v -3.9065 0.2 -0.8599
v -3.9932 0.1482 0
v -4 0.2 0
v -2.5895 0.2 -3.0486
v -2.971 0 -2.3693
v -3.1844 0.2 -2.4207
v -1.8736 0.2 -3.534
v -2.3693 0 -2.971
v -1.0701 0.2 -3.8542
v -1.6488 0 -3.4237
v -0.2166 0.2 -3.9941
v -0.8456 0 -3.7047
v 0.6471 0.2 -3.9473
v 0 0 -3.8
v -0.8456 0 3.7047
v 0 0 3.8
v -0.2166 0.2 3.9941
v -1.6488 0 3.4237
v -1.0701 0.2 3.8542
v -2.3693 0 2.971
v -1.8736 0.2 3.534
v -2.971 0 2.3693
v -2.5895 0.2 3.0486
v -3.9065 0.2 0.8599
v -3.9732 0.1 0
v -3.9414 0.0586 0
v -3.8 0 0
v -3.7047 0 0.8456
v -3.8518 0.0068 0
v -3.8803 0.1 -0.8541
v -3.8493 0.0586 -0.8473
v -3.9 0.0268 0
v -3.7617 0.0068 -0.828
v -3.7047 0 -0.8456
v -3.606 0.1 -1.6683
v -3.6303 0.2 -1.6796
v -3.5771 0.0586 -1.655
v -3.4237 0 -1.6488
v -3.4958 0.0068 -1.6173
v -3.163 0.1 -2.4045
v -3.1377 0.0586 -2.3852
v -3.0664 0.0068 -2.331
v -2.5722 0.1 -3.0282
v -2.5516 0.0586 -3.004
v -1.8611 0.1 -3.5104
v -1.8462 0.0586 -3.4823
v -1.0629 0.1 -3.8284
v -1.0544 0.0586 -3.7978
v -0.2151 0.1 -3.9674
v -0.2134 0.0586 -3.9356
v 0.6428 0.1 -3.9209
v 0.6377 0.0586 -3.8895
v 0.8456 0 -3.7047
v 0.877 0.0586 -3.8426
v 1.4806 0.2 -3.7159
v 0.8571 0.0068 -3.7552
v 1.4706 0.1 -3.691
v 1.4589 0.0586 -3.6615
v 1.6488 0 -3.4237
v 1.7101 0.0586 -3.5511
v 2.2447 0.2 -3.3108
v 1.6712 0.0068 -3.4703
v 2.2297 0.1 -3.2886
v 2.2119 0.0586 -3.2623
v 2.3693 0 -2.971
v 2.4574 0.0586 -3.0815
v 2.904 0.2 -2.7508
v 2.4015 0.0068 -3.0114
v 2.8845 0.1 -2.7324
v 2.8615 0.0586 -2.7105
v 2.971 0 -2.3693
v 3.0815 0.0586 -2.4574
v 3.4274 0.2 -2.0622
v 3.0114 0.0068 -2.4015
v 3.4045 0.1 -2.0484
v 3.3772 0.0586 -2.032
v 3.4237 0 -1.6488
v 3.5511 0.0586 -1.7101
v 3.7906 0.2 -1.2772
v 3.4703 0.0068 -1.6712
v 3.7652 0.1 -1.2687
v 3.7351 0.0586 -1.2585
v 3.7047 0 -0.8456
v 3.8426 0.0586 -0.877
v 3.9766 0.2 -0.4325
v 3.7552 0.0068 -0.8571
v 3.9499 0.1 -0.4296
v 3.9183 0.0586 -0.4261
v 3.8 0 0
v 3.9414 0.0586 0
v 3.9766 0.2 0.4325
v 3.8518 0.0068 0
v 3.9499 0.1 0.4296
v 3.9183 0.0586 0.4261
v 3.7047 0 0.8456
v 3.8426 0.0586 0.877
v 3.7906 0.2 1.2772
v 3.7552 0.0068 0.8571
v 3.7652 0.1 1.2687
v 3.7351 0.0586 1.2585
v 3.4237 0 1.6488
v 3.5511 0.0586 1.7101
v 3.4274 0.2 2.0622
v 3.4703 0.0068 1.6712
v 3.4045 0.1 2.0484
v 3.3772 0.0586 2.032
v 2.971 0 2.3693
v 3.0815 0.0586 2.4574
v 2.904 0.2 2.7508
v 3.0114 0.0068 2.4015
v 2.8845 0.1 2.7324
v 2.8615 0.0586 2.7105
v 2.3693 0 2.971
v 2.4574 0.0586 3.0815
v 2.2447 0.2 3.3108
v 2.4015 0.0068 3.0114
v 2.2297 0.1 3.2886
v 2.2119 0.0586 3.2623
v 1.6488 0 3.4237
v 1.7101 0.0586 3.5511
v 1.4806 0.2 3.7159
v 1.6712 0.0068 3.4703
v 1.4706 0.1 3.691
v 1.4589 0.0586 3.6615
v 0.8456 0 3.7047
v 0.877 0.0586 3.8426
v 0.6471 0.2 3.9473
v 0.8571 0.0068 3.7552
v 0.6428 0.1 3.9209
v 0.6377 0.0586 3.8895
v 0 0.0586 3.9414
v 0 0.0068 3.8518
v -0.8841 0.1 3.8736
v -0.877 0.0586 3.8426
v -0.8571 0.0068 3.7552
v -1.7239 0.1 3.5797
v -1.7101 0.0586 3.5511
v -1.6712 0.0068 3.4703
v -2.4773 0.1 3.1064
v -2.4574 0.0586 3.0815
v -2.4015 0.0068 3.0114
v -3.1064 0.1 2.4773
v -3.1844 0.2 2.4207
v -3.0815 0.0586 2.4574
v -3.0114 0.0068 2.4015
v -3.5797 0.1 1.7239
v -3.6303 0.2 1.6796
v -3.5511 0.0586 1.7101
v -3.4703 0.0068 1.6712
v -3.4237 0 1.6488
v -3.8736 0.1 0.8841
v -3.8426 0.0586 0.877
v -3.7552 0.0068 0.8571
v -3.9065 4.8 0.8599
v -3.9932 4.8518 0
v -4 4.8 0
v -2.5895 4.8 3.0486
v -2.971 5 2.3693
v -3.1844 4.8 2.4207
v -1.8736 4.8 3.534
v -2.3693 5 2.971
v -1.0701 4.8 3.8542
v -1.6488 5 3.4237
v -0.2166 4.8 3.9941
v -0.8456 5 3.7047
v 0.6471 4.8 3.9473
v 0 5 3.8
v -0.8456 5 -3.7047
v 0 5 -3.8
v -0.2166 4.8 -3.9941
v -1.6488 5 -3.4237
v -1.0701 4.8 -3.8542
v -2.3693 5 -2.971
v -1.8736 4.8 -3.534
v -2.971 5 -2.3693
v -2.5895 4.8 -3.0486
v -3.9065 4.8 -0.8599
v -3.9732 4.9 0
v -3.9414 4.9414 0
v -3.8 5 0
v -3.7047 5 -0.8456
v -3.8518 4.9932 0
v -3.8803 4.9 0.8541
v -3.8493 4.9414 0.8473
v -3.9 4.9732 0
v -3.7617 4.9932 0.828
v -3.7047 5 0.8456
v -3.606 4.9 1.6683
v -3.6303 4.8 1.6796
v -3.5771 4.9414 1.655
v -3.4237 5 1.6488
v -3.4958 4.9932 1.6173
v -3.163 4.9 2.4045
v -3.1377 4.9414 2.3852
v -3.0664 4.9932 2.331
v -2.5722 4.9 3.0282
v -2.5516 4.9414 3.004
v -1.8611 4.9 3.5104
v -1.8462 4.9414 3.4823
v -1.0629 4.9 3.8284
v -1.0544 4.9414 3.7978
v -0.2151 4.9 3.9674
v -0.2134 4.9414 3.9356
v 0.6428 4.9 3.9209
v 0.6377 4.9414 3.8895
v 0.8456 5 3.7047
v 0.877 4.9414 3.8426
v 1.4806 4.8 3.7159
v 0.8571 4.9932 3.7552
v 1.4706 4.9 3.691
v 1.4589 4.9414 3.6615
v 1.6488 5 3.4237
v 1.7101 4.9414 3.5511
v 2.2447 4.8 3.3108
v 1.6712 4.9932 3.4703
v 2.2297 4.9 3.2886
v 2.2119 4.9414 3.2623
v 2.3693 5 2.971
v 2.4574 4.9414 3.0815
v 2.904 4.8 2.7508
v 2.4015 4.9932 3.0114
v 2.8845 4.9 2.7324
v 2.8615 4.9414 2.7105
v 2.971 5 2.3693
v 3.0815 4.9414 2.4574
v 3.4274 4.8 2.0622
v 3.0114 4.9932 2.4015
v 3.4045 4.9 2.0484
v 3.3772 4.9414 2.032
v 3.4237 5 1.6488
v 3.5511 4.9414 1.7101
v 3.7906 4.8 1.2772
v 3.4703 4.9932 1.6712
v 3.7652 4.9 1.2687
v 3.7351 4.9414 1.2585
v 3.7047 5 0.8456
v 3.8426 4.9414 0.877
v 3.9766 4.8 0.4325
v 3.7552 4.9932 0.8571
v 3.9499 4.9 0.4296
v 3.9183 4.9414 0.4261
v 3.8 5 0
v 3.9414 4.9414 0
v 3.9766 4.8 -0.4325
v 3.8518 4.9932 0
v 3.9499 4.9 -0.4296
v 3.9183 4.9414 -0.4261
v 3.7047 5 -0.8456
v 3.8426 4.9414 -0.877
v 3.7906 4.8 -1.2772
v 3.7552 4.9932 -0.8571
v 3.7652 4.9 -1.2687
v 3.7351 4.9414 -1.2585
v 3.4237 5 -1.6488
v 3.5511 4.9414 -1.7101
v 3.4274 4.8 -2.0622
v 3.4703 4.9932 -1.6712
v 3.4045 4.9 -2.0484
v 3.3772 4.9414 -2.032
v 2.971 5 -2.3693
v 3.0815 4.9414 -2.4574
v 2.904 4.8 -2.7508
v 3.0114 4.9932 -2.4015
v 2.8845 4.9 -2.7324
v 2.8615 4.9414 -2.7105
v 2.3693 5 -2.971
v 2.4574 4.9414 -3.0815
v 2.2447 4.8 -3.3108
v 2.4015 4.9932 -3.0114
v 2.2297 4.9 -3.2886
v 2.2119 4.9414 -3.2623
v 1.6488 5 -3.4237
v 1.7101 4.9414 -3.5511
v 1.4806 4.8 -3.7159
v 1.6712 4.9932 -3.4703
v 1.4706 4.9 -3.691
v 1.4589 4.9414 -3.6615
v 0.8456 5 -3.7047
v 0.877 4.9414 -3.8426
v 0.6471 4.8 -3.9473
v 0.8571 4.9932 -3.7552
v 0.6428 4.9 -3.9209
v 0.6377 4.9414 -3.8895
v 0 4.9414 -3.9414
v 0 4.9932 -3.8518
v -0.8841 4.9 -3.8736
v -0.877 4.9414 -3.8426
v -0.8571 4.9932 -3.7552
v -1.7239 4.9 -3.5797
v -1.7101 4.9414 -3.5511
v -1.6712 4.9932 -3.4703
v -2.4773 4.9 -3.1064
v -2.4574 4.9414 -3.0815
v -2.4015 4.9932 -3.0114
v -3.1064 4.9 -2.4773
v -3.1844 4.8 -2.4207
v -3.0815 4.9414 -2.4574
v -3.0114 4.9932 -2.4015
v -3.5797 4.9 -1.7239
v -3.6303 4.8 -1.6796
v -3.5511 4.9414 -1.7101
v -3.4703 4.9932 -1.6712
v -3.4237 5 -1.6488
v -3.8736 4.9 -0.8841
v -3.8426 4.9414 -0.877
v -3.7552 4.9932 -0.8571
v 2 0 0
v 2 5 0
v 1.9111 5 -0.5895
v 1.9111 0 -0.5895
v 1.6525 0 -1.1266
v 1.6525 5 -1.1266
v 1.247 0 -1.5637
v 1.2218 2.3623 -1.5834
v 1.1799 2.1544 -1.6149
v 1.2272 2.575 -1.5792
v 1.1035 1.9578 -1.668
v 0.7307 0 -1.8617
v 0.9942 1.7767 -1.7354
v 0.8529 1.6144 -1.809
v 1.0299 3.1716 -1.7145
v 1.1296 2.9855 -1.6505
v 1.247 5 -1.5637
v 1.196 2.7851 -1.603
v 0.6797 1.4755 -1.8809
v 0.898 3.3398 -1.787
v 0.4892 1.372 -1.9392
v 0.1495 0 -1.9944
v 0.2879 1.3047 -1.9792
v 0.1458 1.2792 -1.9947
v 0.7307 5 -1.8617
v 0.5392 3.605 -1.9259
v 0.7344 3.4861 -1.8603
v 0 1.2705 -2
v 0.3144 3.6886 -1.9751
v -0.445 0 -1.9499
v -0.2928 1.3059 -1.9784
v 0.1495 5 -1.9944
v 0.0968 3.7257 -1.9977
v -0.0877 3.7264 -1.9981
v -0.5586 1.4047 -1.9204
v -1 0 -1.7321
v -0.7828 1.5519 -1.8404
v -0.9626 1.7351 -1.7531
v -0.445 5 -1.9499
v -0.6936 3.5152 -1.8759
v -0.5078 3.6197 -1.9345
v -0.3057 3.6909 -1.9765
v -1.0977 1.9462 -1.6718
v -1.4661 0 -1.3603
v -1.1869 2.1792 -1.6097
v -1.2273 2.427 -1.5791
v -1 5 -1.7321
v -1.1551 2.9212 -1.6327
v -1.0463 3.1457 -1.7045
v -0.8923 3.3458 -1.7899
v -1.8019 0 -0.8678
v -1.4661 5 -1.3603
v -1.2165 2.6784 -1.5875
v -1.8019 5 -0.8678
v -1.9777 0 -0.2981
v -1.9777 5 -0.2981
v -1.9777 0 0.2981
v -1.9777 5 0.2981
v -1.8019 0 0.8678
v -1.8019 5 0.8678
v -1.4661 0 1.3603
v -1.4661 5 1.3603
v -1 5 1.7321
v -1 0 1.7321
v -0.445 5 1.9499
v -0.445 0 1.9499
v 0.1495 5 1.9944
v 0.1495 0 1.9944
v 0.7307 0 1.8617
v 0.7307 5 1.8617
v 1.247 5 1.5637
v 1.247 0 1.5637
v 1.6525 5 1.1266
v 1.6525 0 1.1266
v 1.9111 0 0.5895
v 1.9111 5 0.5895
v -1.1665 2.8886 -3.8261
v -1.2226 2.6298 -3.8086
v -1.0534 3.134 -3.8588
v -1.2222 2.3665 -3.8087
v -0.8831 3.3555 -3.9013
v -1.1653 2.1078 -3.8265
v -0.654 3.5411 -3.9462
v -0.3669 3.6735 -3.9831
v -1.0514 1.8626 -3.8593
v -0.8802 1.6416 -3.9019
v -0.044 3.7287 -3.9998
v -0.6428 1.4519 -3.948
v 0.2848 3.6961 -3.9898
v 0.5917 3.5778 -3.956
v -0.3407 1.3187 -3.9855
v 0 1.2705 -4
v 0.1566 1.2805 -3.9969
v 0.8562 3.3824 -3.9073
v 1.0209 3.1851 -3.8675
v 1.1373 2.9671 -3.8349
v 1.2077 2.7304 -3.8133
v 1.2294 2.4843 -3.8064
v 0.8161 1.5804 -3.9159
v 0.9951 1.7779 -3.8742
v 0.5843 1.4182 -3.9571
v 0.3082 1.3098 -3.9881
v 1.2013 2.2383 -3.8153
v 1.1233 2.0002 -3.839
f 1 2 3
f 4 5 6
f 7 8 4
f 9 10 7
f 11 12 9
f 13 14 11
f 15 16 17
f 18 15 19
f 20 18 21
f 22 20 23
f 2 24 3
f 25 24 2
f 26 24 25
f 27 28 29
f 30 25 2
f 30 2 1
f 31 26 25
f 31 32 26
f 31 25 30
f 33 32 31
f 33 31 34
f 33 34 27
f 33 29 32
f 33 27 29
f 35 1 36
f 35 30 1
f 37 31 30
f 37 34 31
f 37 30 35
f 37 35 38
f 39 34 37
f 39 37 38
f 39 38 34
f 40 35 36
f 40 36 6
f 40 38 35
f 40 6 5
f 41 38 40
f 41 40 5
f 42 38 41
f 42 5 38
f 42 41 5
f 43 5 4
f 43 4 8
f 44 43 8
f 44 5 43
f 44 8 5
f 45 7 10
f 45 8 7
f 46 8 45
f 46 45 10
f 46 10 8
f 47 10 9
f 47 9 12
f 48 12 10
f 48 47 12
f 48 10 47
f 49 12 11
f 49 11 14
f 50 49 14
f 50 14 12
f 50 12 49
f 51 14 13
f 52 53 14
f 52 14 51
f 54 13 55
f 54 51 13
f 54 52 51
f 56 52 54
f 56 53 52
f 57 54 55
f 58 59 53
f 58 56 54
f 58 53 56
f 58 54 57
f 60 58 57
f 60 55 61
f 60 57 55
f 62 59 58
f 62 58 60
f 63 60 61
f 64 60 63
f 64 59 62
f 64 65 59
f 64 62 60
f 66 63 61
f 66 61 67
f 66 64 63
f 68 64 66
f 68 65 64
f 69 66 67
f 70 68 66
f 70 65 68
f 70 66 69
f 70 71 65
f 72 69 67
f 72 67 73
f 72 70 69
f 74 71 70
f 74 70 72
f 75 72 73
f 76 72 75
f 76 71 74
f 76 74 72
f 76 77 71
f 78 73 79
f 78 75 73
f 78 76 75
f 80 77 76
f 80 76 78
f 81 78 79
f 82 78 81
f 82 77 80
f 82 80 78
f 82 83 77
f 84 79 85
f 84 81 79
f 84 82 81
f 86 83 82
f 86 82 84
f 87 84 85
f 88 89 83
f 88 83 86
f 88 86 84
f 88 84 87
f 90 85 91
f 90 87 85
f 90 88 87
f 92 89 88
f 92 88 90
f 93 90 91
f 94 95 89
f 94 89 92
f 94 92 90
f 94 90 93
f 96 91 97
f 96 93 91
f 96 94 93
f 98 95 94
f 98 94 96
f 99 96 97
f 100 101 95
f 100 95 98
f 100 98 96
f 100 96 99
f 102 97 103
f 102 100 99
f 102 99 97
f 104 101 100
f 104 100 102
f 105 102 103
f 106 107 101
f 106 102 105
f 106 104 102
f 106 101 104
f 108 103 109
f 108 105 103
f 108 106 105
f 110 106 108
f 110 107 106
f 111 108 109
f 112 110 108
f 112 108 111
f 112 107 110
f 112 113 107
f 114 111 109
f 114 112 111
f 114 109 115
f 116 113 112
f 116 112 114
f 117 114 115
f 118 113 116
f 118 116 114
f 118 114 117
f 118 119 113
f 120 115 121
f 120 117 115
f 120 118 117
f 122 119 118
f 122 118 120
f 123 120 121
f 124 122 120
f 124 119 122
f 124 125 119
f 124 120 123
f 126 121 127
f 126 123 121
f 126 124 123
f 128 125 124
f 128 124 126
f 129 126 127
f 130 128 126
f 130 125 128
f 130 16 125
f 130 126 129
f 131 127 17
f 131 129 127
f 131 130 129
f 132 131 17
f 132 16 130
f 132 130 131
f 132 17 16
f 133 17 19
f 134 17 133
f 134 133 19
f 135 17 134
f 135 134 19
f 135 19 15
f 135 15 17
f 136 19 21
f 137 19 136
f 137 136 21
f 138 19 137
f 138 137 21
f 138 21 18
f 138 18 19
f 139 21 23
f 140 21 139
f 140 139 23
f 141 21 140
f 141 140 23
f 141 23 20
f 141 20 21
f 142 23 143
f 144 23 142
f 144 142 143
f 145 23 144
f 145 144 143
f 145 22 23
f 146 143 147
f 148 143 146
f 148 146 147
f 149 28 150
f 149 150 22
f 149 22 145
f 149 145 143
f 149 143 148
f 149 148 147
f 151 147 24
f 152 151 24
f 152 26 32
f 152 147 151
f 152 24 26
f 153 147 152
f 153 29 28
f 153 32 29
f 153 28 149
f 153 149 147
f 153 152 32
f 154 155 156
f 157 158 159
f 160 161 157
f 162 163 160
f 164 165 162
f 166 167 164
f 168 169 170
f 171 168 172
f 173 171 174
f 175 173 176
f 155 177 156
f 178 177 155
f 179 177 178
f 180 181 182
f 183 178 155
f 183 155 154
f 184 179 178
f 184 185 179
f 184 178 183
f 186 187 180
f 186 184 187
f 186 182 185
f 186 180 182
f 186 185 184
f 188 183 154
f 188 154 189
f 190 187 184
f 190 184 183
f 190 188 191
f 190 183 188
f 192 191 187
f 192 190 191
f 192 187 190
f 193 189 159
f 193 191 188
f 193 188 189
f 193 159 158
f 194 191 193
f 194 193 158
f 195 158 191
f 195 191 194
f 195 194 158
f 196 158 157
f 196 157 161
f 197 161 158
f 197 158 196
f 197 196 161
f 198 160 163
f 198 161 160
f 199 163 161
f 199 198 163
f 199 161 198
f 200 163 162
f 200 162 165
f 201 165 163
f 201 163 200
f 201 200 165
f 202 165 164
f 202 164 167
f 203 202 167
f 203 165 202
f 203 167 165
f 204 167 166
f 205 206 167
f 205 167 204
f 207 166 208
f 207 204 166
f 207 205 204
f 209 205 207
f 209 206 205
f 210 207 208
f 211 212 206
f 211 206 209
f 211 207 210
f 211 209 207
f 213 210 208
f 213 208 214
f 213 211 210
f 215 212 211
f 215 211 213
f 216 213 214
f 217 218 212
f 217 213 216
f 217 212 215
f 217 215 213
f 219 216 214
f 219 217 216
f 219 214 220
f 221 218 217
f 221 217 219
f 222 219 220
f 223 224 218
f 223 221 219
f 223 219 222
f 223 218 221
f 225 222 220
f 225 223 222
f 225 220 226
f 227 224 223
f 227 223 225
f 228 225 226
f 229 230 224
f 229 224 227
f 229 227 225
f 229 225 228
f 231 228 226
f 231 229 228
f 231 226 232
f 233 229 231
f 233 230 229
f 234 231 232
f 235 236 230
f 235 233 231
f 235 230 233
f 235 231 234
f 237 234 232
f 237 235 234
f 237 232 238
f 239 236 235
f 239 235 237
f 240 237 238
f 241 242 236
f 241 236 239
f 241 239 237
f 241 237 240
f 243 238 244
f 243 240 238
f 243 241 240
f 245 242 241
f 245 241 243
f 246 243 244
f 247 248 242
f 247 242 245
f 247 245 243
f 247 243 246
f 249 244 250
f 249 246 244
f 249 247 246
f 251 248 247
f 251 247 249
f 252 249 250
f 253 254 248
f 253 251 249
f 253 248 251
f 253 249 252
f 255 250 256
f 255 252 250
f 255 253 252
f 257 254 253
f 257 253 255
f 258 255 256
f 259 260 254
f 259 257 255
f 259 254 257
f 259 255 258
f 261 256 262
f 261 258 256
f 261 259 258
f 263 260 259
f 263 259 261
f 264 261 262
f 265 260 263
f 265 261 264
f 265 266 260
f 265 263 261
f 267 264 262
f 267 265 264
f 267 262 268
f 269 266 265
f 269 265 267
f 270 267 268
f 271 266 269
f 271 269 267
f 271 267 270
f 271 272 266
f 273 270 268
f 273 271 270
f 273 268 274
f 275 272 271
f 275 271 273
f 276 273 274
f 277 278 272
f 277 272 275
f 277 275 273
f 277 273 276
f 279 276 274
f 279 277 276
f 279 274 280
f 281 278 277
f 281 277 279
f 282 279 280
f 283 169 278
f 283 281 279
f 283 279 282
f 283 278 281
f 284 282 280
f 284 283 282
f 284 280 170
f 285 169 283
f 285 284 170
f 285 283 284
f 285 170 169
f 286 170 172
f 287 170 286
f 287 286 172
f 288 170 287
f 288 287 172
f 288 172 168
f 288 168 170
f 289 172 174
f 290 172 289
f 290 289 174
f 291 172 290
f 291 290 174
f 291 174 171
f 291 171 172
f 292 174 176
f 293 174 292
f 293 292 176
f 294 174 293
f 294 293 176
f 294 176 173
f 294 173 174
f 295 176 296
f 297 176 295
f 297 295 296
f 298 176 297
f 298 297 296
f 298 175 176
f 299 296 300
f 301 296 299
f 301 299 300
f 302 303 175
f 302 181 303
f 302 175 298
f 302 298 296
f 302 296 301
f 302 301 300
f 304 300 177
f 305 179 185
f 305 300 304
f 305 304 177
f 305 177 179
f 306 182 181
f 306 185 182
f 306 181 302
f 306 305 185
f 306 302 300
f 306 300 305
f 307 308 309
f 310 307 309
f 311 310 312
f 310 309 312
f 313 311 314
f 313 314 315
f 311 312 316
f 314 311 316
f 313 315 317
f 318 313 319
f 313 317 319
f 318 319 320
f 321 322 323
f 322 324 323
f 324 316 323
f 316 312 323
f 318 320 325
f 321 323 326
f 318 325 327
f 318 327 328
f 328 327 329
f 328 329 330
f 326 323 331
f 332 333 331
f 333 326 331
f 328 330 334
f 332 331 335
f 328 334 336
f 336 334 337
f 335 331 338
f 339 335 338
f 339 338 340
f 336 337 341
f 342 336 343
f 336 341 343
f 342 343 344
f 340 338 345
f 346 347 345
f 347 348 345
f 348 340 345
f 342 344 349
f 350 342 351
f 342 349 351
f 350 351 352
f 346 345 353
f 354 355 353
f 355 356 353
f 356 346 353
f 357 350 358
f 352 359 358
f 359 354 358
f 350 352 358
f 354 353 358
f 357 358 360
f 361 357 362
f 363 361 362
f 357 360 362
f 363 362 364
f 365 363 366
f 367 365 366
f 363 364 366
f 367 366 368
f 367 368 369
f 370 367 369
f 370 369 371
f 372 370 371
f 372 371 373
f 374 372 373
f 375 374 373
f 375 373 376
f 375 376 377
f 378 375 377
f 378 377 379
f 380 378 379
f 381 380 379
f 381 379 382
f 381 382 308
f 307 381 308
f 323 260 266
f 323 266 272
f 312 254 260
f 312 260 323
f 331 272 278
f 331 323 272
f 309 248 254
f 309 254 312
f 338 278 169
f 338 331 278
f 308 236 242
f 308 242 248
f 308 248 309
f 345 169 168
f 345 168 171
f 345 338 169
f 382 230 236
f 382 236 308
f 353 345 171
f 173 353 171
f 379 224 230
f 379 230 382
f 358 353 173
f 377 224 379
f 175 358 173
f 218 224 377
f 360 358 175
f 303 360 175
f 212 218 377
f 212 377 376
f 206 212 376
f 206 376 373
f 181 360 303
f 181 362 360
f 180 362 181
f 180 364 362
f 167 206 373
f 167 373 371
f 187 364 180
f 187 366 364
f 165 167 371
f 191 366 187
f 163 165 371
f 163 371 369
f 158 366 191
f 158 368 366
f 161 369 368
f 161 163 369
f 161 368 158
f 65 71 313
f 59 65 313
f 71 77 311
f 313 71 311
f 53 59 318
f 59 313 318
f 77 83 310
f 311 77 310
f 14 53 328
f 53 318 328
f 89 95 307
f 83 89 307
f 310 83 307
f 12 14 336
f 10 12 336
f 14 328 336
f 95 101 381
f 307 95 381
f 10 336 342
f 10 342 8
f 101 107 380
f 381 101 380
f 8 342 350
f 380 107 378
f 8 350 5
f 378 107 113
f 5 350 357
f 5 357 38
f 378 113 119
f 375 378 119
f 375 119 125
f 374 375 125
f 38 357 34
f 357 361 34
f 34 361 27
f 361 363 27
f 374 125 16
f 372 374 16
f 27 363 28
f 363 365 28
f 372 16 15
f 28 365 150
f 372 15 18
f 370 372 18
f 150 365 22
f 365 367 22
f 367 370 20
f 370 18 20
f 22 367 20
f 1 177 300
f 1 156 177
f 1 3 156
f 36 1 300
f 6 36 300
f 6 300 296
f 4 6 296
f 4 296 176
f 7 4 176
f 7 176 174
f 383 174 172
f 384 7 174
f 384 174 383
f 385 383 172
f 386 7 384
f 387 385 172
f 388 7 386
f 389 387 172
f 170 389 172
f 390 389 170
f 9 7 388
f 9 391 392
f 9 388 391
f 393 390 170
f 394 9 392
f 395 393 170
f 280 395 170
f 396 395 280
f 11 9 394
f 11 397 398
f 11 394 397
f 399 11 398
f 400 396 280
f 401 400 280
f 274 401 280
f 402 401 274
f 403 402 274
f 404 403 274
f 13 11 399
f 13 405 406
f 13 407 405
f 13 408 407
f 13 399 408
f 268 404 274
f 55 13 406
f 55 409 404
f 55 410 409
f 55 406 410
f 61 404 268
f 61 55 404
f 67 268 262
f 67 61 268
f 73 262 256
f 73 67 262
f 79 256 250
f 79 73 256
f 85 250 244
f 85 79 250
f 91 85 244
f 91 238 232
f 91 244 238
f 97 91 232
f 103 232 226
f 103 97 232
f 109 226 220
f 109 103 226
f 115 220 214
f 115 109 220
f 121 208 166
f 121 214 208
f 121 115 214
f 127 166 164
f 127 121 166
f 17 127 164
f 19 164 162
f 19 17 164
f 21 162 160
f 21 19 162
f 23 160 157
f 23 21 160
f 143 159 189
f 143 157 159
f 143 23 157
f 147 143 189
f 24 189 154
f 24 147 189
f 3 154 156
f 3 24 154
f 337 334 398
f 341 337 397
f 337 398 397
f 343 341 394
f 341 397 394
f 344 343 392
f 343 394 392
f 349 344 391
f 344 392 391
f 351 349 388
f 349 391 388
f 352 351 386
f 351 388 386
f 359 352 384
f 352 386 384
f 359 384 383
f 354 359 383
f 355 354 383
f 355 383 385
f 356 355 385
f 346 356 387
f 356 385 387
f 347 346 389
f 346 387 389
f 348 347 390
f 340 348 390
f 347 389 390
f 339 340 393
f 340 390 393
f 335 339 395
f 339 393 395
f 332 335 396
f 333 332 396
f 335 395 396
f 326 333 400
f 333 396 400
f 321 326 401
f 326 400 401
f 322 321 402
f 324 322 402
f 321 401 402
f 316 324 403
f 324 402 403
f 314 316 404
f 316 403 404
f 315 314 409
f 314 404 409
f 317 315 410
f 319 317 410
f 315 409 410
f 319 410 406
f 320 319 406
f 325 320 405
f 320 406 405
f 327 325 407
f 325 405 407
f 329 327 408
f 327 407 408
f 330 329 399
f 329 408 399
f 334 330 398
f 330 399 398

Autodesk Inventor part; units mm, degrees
ref_plane "YZ Plane" through (0, 0, 0) normal (1, 0, 0) x (0, 1, 0)
ref_plane "XZ Plane" through (0, 0, 0) normal (0, 1, 0) x (-1, 0, 0)
ref_plane "XY Plane" through (0, 0, 0) normal (0, 0, 1) x (1, 0, 0)
sketch "スケッチ1" plane through (0, 0, 0) normal (0, 1, 0) x (-1, 0, 0)
  circle A0 centre (0, 0) radius 4
  dimension "d0" = 8
extrude "押し出し1" add sketch "スケッチ1" along normal blind 5
fillet "フィレット1" radius 0.2 1 edges at (4, 5, 0)
fillet "フィレット2" radius 0.2 1 edges at (4, 0, 0)
sketch "スケッチ2" plane through (0, 5, 0) normal (0, 1, 0) x (1, 0, 0)
  circle A0 centre (0, 0) radius 2
  dimension "d5" = 4
extrude "押し出し2" cut sketch "スケッチ2" against normal blind 5
sketch "スケッチ3" plane through (0, 0, 0) normal (0, 0, 1) x (1, 0, 0)
  line L0 (3.8, 0) -> (-3.8, 0) projected
  point P0 (0, 0)
  point P1 (0, 2.5)
  dimension "d8" = 2.5
hole "穴1" at (0, 2.5, 0) direction (0, 0, -1) diameter 2.459 depth 5 tip angle 118 thread size "M3x0.5" class "6H" standard "ANSI Metric M Profile"
properties part number "シャフトカラー" material "ステンレス鋼"
